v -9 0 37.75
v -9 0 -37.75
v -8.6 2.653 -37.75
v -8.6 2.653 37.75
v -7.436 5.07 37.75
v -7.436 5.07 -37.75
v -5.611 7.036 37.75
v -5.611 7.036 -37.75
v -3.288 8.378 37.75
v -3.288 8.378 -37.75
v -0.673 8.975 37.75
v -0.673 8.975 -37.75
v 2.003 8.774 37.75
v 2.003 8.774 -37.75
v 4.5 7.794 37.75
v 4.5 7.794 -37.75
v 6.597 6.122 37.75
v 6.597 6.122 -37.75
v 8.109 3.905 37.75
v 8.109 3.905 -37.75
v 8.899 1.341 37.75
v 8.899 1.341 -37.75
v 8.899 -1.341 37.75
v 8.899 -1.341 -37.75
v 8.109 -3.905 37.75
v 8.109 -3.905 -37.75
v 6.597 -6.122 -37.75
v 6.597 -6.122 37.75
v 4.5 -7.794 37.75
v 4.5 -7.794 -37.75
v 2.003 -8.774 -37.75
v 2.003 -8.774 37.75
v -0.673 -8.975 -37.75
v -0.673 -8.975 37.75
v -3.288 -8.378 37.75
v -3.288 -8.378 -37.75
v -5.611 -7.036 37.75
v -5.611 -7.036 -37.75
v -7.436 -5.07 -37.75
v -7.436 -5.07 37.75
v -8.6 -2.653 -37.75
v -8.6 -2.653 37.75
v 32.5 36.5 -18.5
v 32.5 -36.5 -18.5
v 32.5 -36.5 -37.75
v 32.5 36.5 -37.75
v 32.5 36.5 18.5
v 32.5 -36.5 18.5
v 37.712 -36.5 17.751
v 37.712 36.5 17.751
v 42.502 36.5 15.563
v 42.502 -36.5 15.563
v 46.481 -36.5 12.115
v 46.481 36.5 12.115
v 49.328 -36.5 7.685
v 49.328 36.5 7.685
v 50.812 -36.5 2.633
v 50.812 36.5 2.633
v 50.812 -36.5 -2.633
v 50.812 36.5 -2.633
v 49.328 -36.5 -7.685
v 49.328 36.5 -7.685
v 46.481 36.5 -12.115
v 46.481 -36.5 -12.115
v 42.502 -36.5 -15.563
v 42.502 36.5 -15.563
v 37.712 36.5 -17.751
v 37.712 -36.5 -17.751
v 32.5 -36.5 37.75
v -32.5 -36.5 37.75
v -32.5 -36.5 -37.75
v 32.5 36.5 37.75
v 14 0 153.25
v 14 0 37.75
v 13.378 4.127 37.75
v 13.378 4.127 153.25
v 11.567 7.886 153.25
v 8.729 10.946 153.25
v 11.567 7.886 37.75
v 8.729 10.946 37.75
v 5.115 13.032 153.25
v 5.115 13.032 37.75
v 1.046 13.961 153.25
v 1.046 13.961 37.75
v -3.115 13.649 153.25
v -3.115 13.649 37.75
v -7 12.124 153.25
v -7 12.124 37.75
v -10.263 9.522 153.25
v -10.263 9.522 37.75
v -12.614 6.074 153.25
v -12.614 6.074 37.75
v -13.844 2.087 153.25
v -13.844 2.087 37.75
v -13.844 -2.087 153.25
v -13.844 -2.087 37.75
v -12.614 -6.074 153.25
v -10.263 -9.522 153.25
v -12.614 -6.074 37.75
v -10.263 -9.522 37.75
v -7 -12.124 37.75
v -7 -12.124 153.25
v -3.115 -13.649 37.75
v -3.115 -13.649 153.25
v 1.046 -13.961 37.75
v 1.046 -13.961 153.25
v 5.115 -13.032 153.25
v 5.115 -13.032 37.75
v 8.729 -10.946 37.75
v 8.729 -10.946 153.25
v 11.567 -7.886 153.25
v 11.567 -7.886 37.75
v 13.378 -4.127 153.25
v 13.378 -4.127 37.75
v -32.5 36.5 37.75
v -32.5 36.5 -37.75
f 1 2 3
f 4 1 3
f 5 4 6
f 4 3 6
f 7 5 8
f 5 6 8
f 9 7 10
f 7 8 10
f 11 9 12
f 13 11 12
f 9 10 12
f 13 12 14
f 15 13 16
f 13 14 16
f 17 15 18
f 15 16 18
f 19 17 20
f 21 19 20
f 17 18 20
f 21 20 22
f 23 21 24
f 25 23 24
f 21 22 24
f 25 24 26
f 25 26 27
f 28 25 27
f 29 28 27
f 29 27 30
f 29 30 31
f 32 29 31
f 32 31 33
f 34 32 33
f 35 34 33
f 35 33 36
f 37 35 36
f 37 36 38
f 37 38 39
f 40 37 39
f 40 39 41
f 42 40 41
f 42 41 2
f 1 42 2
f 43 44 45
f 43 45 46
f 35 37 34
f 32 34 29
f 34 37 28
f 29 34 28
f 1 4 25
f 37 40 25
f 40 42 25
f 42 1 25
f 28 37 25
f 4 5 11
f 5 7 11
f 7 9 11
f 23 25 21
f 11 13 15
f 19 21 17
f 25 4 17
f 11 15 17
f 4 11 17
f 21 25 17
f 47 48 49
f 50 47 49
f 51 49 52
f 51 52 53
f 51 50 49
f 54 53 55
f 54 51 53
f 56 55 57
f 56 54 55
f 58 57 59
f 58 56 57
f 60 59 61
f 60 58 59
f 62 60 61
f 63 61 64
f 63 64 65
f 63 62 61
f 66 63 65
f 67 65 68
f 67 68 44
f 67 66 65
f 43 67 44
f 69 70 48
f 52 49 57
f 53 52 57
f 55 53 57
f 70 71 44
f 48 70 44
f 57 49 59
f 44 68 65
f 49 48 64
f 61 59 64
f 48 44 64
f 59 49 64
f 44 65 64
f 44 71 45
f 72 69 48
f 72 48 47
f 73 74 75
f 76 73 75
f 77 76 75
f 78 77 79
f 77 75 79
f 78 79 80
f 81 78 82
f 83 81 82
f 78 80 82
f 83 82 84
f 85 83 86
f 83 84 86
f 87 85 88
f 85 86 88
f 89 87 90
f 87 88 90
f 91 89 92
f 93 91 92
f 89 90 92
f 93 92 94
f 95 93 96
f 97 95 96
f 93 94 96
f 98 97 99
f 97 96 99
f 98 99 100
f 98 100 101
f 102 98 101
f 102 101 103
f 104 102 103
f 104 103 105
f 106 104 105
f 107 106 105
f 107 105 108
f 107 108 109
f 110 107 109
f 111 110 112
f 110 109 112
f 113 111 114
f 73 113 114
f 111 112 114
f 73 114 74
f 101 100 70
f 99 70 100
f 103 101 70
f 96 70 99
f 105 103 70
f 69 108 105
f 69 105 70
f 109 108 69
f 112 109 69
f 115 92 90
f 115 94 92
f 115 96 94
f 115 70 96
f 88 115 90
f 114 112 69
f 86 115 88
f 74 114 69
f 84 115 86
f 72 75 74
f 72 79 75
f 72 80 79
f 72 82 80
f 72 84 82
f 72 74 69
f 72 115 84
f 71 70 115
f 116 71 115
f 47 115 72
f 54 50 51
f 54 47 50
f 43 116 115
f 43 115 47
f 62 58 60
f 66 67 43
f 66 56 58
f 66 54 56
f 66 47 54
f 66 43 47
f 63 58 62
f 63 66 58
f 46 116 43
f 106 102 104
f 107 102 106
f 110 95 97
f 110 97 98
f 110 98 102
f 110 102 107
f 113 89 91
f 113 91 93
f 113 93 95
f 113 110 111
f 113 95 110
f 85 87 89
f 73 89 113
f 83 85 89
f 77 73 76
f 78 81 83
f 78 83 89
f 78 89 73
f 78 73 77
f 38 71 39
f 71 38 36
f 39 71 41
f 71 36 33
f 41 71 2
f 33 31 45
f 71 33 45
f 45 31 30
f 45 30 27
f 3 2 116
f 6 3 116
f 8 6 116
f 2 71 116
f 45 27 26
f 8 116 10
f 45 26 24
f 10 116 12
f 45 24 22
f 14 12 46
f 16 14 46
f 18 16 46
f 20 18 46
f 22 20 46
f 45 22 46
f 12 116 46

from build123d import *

# Parameters (mm, degrees)
ESBO_O1_W                = 65
ESBO_O1_H                = 73
RESSALTO_EXTRUS_O1_DEPTH = 37.75
ESBO_O2_R                = 9
CORTE_EXTRUS_O1_DEPTH    = 105.5
ESBO_O3_R                = 14
RESSALTO_EXTRUS_O2_DEPTH = 115.5
ESBO_O4_R                = 18.5
RESSALTO_EXTRUS_O3_DEPTH = 73


with BuildPart() as part:
    # Esboço1 → Ressalto-extrusão1 (new body, symmetric)
    with BuildSketch(Plane.XY):
        Rectangle(ESBO_O1_W, ESBO_O1_H)
    extrude(amount=RESSALTO_EXTRUS_O1_DEPTH, both=True)

    # Esboço2 → Corte-extrusão1 (cut)
    with BuildSketch(Plane(origin=(0, 0, -37.75), x_dir=(-1, 0, 0), z_dir=(0, 0, -1))):
        Circle(ESBO_O2_R)
    extrude(amount=-CORTE_EXTRUS_O1_DEPTH, mode=Mode.SUBTRACT)

    # Esboço3 → Ressalto-extrusão2 (add)
    with BuildSketch(Plane.XY.offset(37.75)):
        Circle(ESBO_O3_R)
    extrude(amount=RESSALTO_EXTRUS_O2_DEPTH)

    # Esboço4 → Ressalto-extrusão3 (add)
    with BuildSketch(Plane(origin=(0, 36.5, 0), x_dir=(1, 0, 0), z_dir=(0, 1, 0))):
        with Locations((32.5, 0)):
            Circle(ESBO_O4_R)
    extrude(amount=-RESSALTO_EXTRUS_O3_DEPTH)


solid = part.part
